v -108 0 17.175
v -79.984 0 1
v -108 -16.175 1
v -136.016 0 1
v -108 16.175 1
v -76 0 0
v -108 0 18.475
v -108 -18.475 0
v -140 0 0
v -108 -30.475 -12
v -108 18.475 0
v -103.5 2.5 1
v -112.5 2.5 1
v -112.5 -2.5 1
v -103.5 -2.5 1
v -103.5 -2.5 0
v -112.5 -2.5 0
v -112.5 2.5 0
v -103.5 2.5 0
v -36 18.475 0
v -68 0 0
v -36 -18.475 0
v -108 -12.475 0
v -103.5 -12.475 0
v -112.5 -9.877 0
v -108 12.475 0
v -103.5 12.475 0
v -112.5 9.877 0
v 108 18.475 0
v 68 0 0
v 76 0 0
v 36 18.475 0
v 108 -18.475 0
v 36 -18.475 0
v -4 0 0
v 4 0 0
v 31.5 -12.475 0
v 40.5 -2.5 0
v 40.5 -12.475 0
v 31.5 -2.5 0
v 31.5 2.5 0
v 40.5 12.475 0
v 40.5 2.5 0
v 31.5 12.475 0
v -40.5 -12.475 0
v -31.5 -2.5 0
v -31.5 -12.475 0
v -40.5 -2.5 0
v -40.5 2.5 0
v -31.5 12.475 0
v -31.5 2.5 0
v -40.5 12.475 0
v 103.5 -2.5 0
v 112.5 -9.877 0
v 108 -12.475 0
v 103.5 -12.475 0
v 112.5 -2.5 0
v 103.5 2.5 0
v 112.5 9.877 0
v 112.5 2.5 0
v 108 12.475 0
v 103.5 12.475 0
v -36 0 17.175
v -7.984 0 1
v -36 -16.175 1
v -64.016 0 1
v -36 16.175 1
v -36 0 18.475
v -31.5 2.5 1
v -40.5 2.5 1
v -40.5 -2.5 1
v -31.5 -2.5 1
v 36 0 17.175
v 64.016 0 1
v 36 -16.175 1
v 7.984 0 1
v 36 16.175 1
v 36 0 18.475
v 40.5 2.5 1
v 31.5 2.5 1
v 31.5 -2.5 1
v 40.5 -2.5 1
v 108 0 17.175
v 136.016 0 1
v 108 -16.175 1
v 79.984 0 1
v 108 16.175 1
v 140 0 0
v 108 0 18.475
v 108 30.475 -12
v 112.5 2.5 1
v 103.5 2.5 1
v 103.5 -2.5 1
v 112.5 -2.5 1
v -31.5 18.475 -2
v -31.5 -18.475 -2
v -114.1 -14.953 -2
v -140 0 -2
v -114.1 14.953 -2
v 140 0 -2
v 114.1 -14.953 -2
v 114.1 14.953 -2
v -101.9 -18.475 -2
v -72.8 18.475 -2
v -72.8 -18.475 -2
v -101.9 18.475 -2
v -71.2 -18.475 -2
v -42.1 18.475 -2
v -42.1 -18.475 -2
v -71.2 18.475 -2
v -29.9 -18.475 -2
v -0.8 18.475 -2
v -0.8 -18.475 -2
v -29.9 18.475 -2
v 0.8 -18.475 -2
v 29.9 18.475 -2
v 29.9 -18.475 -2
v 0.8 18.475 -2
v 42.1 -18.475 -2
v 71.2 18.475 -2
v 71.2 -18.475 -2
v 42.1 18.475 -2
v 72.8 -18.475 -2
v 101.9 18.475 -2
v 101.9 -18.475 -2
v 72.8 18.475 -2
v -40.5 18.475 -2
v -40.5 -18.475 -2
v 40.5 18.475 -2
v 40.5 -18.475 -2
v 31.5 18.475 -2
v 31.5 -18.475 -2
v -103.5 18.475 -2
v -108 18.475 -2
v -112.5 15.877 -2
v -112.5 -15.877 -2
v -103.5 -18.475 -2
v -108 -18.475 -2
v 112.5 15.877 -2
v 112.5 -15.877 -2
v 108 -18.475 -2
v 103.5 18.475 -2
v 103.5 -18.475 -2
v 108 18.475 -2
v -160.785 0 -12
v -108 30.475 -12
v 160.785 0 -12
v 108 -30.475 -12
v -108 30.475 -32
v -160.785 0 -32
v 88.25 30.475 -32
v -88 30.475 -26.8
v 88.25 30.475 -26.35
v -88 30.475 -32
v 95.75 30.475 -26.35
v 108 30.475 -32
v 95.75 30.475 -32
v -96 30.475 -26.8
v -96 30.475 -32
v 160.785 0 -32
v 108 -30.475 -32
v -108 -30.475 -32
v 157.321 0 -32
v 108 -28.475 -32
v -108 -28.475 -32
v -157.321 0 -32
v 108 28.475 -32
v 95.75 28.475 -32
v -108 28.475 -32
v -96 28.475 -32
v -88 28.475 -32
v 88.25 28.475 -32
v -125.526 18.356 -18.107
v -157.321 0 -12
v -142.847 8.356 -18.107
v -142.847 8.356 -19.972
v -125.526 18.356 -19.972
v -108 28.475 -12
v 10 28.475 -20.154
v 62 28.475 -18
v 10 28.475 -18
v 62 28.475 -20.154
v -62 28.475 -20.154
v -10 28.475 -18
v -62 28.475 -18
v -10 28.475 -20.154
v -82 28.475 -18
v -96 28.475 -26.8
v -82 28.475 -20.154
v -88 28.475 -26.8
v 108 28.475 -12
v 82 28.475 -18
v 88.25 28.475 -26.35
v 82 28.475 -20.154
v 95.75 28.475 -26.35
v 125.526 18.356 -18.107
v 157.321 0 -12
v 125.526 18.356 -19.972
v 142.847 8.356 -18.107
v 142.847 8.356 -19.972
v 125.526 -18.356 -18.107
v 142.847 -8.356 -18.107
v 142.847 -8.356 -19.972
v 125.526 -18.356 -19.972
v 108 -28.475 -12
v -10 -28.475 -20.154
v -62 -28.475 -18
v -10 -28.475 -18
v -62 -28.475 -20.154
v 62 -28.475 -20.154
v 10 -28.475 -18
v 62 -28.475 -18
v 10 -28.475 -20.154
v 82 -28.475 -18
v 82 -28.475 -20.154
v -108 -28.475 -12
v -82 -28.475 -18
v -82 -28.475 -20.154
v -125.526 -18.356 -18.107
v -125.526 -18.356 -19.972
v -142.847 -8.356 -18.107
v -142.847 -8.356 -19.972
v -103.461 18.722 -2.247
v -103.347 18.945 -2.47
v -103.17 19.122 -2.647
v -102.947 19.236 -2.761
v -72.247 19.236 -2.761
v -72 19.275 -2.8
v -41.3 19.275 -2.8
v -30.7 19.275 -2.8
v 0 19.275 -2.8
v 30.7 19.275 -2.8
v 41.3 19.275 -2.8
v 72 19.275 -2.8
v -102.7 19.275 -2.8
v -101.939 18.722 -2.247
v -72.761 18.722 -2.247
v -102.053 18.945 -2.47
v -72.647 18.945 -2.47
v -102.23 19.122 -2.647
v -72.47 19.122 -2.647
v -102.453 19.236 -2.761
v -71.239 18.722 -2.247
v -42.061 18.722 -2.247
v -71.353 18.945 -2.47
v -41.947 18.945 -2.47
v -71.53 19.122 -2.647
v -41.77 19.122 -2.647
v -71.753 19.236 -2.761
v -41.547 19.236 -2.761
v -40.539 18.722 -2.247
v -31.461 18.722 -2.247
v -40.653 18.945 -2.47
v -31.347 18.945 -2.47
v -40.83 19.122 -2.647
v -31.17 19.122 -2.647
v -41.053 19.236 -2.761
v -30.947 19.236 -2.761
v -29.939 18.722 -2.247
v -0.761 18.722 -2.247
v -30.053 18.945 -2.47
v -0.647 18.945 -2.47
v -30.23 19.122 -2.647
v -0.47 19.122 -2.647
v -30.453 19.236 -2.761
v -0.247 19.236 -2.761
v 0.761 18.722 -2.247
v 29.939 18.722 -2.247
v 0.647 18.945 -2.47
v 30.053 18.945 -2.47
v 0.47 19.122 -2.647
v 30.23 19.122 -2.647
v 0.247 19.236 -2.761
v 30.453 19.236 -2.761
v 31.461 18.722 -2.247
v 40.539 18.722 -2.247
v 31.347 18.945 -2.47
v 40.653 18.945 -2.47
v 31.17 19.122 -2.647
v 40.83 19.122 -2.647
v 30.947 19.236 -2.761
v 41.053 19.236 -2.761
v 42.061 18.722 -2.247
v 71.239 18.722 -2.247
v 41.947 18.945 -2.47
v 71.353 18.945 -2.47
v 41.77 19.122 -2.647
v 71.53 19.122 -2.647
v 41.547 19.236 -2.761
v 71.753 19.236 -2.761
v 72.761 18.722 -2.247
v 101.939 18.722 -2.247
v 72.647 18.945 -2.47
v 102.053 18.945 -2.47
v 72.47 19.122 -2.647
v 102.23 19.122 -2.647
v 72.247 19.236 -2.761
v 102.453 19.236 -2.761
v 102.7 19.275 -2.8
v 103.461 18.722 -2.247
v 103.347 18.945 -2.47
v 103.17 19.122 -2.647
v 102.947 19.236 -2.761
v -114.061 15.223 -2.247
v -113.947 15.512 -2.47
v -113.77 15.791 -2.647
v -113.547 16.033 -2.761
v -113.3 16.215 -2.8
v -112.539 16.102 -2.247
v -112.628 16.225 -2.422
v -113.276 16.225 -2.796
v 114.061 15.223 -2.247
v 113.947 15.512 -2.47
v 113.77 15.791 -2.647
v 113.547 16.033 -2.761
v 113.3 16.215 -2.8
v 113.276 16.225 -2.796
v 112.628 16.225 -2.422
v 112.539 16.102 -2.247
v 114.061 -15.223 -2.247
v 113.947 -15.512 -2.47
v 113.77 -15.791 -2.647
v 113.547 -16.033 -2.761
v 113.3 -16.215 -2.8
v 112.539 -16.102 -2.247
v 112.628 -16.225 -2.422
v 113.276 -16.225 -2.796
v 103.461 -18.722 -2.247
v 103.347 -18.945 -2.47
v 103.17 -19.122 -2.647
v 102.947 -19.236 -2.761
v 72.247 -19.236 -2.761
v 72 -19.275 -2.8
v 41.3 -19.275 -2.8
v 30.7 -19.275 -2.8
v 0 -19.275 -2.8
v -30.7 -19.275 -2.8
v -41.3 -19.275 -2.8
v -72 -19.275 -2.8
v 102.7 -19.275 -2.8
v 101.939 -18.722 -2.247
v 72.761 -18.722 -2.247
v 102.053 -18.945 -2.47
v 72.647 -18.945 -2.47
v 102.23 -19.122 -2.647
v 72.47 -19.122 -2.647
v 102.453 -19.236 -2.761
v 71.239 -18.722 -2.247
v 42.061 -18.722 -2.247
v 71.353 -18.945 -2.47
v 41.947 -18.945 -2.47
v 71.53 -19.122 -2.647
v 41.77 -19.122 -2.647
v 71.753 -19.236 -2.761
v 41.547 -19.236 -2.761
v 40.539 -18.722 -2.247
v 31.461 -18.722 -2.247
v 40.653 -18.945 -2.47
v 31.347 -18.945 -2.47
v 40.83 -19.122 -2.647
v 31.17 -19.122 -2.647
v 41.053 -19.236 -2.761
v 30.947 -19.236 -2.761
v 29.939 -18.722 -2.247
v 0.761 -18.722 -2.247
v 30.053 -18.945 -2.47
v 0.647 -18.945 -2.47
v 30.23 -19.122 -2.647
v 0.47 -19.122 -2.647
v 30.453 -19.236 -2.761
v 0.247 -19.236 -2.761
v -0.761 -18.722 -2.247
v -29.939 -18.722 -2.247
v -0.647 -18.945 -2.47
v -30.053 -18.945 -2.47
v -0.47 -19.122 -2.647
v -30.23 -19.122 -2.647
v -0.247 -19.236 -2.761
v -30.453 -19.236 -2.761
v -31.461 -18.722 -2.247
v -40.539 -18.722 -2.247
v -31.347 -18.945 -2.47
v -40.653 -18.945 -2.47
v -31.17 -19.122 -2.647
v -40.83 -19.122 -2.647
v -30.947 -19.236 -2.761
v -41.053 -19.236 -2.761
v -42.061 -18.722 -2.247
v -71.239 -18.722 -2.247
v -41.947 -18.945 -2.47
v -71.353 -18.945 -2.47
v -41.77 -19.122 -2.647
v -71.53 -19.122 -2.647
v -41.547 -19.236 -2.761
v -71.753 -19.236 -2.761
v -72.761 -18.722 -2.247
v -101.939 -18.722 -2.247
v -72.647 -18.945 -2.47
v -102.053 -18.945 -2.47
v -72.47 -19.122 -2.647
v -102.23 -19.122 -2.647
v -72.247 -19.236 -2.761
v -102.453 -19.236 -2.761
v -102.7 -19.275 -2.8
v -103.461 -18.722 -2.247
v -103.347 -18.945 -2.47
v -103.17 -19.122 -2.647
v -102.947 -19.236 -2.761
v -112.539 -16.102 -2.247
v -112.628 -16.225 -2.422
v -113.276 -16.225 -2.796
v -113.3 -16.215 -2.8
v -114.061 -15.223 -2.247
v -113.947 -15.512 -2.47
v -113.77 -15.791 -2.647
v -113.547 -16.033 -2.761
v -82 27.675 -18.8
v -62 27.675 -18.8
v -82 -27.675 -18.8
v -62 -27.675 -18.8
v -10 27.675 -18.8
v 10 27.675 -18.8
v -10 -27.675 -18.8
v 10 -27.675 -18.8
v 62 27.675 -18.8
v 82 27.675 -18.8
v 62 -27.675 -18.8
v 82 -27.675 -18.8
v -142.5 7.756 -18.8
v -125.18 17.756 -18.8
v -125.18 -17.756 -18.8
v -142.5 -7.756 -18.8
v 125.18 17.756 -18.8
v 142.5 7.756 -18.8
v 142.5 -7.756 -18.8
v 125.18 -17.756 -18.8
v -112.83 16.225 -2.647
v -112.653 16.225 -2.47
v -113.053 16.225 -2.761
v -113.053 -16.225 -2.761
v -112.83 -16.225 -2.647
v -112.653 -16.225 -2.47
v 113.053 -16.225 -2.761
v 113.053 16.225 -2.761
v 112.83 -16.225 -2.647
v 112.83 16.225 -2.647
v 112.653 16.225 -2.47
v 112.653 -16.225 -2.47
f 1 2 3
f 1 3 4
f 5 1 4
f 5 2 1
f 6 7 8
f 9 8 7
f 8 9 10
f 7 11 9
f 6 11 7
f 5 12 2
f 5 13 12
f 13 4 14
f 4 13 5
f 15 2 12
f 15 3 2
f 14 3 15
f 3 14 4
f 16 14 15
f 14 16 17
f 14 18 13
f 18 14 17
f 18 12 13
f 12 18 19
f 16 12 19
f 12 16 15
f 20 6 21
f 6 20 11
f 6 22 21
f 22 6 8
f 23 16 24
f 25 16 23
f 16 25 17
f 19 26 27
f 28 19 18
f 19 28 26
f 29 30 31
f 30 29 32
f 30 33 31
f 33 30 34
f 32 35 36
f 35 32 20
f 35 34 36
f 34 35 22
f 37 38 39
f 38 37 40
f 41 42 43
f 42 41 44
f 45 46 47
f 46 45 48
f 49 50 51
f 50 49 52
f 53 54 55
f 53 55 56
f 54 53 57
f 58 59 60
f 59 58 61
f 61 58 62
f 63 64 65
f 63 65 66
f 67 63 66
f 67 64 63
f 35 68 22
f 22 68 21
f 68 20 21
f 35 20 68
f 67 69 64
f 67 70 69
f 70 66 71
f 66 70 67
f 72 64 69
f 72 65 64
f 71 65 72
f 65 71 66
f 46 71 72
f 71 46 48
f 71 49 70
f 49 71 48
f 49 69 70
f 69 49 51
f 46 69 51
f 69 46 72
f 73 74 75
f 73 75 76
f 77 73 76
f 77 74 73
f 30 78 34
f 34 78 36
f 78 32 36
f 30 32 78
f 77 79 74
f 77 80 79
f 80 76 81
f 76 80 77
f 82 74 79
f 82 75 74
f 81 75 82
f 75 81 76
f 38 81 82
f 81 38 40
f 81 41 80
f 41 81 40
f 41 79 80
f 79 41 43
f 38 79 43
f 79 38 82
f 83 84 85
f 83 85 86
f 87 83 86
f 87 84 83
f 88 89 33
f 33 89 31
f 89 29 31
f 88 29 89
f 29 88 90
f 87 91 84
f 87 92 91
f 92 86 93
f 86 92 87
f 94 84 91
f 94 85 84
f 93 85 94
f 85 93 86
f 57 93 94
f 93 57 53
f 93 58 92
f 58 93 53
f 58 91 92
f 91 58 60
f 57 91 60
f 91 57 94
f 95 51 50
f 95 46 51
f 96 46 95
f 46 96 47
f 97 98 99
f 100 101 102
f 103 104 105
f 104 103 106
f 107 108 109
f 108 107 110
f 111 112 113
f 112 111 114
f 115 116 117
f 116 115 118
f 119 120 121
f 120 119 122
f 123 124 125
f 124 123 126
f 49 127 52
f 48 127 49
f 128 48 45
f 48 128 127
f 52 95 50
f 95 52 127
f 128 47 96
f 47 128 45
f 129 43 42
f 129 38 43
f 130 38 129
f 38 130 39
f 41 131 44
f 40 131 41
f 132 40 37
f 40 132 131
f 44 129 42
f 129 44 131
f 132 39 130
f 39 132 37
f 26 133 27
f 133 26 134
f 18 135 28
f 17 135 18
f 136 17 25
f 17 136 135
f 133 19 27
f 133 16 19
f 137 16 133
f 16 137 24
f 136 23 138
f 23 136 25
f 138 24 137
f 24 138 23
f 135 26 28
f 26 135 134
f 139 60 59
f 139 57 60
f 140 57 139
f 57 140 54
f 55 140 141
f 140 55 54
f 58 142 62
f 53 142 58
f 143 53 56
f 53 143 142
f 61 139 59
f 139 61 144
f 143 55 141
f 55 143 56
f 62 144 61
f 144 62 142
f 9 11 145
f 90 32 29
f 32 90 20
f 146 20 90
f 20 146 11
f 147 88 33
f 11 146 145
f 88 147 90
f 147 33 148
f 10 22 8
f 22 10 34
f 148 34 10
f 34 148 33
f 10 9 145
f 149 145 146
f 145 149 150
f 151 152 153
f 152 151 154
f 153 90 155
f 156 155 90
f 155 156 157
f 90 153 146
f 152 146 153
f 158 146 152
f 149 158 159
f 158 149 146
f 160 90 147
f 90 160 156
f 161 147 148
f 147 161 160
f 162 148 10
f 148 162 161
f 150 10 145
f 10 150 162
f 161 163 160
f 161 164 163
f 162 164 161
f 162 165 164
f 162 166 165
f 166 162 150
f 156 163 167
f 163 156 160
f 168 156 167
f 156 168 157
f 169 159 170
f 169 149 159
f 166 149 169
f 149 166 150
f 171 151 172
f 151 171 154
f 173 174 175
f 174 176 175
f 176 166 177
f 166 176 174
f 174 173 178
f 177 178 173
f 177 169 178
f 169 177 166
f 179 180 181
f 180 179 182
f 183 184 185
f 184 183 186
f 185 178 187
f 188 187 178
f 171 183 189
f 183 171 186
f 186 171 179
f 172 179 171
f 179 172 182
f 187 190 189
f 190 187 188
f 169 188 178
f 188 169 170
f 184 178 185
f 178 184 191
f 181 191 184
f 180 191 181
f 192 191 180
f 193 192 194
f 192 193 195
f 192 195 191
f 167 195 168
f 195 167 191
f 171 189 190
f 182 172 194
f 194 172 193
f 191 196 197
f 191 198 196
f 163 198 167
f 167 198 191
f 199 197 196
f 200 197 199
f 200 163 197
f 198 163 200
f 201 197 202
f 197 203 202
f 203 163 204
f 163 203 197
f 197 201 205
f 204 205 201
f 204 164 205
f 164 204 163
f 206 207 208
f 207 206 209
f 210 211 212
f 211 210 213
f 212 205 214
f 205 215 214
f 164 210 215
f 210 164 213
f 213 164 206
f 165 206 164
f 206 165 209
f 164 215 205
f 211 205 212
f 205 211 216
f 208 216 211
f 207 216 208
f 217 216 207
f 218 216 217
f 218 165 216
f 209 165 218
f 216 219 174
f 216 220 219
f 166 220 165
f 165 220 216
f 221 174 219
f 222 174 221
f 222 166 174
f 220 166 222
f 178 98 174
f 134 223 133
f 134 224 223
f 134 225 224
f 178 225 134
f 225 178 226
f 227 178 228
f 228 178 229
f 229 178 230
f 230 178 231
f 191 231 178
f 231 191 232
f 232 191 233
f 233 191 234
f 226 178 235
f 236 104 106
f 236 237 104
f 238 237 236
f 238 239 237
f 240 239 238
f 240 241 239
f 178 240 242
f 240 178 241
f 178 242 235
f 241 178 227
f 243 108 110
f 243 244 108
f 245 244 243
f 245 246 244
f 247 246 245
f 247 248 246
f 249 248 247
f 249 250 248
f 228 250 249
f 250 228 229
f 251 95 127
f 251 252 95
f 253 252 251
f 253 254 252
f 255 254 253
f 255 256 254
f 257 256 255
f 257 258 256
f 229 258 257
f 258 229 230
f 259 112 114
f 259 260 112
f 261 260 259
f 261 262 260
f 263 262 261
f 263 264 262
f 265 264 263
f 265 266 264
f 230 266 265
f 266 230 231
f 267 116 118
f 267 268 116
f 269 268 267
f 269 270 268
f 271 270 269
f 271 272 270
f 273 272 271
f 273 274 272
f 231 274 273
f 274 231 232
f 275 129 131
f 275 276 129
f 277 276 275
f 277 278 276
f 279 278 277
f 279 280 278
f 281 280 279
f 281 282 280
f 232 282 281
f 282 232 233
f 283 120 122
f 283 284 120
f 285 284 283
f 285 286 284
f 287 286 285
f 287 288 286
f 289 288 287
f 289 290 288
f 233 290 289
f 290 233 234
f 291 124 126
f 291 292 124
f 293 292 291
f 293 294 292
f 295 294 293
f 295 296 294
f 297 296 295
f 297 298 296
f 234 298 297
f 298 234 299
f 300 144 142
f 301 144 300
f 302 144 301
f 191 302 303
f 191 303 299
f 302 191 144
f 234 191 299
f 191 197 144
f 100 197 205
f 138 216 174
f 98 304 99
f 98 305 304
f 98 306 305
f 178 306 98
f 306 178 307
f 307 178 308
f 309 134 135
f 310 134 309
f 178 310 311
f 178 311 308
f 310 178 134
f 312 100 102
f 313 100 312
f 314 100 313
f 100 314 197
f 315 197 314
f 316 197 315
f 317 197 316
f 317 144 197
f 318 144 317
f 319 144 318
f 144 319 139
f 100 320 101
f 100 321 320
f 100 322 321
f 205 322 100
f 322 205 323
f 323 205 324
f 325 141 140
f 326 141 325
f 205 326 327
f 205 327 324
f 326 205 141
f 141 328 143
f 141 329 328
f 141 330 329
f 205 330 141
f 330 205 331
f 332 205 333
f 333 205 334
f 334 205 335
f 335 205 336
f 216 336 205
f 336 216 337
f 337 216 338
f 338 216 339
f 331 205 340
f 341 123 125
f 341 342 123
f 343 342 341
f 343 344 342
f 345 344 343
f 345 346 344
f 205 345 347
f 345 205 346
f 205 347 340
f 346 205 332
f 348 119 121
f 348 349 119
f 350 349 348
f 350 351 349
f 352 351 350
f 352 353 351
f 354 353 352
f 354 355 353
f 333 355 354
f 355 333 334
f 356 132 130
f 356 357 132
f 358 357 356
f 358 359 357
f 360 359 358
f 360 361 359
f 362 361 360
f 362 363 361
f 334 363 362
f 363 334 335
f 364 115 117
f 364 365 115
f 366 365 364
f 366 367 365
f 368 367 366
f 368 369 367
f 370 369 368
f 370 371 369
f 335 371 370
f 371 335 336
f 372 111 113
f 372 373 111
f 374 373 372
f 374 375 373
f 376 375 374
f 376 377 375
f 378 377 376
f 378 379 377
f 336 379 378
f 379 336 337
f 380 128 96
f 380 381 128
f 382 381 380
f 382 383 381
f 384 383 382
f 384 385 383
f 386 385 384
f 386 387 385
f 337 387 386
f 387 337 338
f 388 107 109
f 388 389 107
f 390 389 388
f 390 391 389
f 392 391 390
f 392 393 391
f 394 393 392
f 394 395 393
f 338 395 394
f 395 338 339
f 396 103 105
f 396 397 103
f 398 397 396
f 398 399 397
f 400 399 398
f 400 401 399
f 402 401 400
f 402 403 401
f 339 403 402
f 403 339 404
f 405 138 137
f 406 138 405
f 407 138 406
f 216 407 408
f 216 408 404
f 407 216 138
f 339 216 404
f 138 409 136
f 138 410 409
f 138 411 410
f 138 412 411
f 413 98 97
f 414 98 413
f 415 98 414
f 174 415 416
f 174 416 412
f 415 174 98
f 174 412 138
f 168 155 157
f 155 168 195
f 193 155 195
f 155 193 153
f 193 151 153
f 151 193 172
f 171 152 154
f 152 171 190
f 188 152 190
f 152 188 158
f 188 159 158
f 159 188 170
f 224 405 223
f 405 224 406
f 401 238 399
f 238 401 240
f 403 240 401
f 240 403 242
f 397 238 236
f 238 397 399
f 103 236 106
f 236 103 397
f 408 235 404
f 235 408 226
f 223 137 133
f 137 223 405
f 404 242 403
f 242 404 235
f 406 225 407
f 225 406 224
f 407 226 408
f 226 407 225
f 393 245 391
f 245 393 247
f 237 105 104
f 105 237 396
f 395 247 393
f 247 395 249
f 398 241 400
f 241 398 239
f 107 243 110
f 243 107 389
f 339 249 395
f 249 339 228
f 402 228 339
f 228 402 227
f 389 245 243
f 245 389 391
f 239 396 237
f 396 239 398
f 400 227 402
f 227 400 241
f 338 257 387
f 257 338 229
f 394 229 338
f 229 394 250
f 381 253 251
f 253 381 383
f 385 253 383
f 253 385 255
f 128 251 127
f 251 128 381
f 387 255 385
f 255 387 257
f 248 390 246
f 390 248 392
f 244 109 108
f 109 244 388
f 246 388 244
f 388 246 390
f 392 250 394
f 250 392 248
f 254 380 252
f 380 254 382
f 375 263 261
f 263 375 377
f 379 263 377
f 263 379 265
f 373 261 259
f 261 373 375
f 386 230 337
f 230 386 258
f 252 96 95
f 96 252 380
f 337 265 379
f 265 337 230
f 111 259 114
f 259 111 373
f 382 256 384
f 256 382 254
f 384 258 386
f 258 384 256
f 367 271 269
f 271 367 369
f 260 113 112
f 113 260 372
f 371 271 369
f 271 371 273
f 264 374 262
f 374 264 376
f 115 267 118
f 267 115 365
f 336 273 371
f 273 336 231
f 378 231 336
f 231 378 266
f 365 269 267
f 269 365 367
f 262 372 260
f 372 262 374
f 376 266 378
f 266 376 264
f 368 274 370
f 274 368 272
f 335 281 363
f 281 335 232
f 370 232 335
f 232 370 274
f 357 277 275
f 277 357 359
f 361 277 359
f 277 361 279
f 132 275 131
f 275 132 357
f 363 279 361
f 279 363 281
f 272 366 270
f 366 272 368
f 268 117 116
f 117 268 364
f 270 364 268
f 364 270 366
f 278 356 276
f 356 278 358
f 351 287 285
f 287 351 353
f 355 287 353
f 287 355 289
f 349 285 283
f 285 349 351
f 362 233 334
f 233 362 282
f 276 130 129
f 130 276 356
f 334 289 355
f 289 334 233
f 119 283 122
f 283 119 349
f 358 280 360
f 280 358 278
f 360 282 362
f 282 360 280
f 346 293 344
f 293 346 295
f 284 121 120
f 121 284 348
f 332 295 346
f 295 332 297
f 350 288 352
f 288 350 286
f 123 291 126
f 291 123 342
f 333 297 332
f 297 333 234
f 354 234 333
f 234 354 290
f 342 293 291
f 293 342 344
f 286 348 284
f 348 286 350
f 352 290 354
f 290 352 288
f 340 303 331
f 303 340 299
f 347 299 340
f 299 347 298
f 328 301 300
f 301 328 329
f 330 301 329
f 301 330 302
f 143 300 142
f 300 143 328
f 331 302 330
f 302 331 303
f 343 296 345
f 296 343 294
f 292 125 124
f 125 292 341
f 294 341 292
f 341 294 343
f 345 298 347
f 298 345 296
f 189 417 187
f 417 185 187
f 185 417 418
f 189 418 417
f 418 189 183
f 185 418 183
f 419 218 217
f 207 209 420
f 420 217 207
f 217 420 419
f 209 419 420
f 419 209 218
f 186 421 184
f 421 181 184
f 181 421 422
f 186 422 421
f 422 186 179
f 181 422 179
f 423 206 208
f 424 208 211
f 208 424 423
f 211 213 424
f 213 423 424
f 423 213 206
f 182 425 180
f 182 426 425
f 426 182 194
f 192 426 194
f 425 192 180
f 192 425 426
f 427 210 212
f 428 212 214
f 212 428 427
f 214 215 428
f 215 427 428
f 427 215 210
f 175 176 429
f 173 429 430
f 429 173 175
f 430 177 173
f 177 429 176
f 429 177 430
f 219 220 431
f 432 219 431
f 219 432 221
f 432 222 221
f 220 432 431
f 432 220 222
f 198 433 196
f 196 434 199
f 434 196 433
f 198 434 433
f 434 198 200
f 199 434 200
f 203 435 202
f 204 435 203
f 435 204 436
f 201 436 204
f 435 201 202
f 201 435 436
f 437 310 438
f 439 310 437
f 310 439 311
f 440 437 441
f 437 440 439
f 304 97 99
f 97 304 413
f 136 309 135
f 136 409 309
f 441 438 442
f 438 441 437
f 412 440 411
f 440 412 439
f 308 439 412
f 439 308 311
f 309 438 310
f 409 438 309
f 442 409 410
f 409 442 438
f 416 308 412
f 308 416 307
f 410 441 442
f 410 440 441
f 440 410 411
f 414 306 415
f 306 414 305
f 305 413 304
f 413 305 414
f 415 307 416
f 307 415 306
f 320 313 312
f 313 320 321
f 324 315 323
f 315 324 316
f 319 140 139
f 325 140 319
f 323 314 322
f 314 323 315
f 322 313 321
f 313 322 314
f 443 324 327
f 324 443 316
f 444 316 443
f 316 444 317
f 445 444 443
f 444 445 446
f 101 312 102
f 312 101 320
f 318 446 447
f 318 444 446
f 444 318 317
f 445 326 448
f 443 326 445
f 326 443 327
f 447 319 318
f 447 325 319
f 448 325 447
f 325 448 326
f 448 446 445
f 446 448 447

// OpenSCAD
s3 = sqrt(3);
s2 = sqrt(2);

studwidth = 64;
studheight = studwidth/s3/2;
holesize = 8;
holeheight = 8;
holetop = 11;
bottom = 1;
thickness = 1.3;
numstuds = 4;
studspace = 8;
sideheight = 12;
boxheight = 20;
boxthick = 2;
edge = 0;

for (i = [0:numstuds-1]) {
    color("white")
    translate([(i-(numstuds-1)/2)*(studwidth+studspace),0,0])
    lightstud();
}
color("DimGray") lightbox();
*color("Gray") translate([0,0,-boxheight-sideheight]) lightbottom();

*color("Teal") translate([0,1,-boxheight-sideheight+boxthick+1]) rotate([180,0,-90]) batteryholder();

*rotate([0,0,40]) mirror([0,0,1]) lightbox();
*lightstud();
*rotate([0,0,40]) lightbottom();


module clip() {
    cw = 6/2;
    ch = bottom+boxthick;
    linear_extrude(height=1) polygon([
        [-cw-1,-2],[-cw-2,-1],[-cw-2,0],
        [-cw,0],[-cw,ch],[-cw-1.5,ch+1.5],[-cw+0.5,ch+3.5],
        [-cw+2,ch+2],[-cw+2,0],
        [cw-2,0],[cw-2,ch+2],
        [cw-0.5,ch+3.5],[cw+1.5,ch+1.5],[cw,ch],[cw,0],
        [cw+2,0],[cw+2,-1],[cw+1,-2]
    ]);
}

module lightbox() {
    ol = boxthick-1;
    xs2 = (studwidth*(numstuds-1) + studspace*(numstuds-1))/2;
    xs1 = xs2 + studwidth/2 + s3*edge;
    ys = studheight + edge;
    h = sideheight;
    h2 = h + boxheight+2;
    xb1 = xs1 + h*s3;
    xb2 = xs2;
    yb = ys + h;
    
    xo1 = xb1 - ol*s3;
    xo2 = xb2;
    yo = yb - ol;
    
    ho = h2 - boxthick;
    xi1 = xb1 - boxthick*s3;
    xi2 = xb2;
    yi = yb - boxthick;
    hi = boxthick;
    
    sxs = studwidth/2-0.4*s3;
    sys = studwidth/s3/2-0.4;
    
    gw = 9/2;
    
    difference() {
        polyhedron(convexity=10,
            points = concat(
                hexbox(xs1,xs2,ys,0),
                hexbox(xb1,xb2,yb,-h),
                hexbox(xb1,xb2,yb,-ho),
                hexbox(xo1,xo2,yo,-ho),
                hexbox(xo1,xo2,yo,-ho),
                hexbox(xi1,xi2,yi,-ho),
                hexbox(xi1,xi2,yi,-h),
                hexbox(xs1,xs2,ys,-hi)
            ),
            faces = concat(
                [[for(i=[0:5]) i]],
                nquads(6,0),
                nquads(6,6),
                nquads(6,12),
                nquads(6,18),
                nquads(6,24),
                nquads(6,30),
                nquads(6,36),
                [[for(i=[5:-1:0]) i+42]]
            )
        );

        ys2 = ys-hi*3;
        #for (i = [1:numstuds-2]) {
            translate([(i-(numstuds-1)/2)*(studwidth+studspace),0,0]) 
            polyhedron(
                points = [
                [-gw,ys2,0],[gw,ys2,0],[gw,-ys2,0],[-gw,-ys2,0],
                [-gw,ys,-hi],[gw,ys,-hi],[gw,-ys,-hi],[-gw,-ys,-hi]],
                faces = [
                [0,1,2,3],
                [1,0,4,5],[2,1,5,6],[3,2,6,7],[0,3,7,4],
                [7,6,5,4]
                ]
            );
        }
        ysa = ys - gw/s3;
        ys2a = ys2 - gw/s3;
        #for (i = [-1:2:1]) {
            scale([i,1,1])
            translate([(((numstuds-1)/2))*(studwidth+studspace),0,0]) 
            polyhedron(
                points = [
                [-gw,ys2,0],[0,ys2,0],[gw,ys2a,0],[gw,-ys2a,0],[0,-ys2,0],[-gw,-ys2,0],
                [-gw,ys,-hi],[0,ys,-hi],[gw,ysa,-hi],[gw,-ysa,-hi],[0,-ys,-hi],[-gw,-ys,-hi]],
                faces = [
                [0,1,2,3,4,5],
                [1,0,6,7],[2,1,7,8],[3,2,8,9],
                [4,3,9,10],[5,4,10,11],[0,5,11,6],
                [11,10,9,8,7,6]
                ]
            );
        }
        // Switch hole
        translate([(numstuds/2-1)*(studwidth+studspace)+20,yi,boxthick-1-h2]) {
            translate([0,1,3.8])
            #cube([7.5,2.2,5.7],true);
        }

        // Micro-usb hole
        translate([-(numstuds/2-1)*(studwidth+studspace)-20,yi,boxthick-h2]) { 
            translate([0,1,2.6])
            #cube([8, 2.2, 5.2], true);
        }
    }
    
    for (i = [1:numstuds-1]) {
        translate([(i-(numstuds)/2)*(studwidth+studspace),0,-boxthick]) {
            translate([-30.7,0,0]) rotate([90,0,0]) cylinder(ys*2+1.7,0.8,0.8,true,$fn=20);
            //translate([  -10,0,0]) rotate([90,0,0]) cylinder(ys*2+1.7,0.8,0.8,true,$fn=20);
            translate([    0,0,0]) rotate([90,0,0]) cylinder(ys*2+1.7,0.8,0.8,true,$fn=20);
            translate([ 30.7,0,0]) rotate([90,0,0]) cylinder(ys*2+1.7,0.8,0.8,true,$fn=20);
        }
    }
    translate([(-numstuds/2)*(studwidth+studspace),0,-boxthick])
    translate([ 30.7,0,0]) rotate([90,0,0]) cylinder(ys*2-4.5,0.8,0.8,true,$fn=20);
    translate([(numstuds/2)*(studwidth+studspace),0,-boxthick])

    translate([-30.7,0,0]) rotate([90,0,0]) cylinder(ys*2-4.5,0.8,0.8,true,$fn=20);


    translate([0,0,-boxheight-sideheight+5]) {
        for (i = [0:numstuds-2]) {
            bottomtablip((i-(numstuds-2)/2)*(studwidth+studspace));
            mirror([0,1,0]) bottomtablip((i-(numstuds-2)/2)*(studwidth+studspace));
        }
        rpos = (studheight+edge+sideheight-boxthick-0.8) * s3/2;
        translate([-(studwidth+studspace)*(numstuds-1)/2,0,0]) rotate([0,0,30]) bottomtablip(-studwidth/4, rpos);
        translate([-(studwidth+studspace)*(numstuds-1)/2,0,0]) rotate([0,0,150]) bottomtablip(studwidth/4, rpos);
        translate([(studwidth+studspace)*(numstuds-1)/2,0,0]) rotate([0,0,-30]) bottomtablip(studwidth/4, rpos);
        translate([(studwidth+studspace)*(numstuds-1)/2,0,0]) rotate([0,0,-150]) bottomtablip(-studwidth/4, rpos);
    }
}

module lightbottom() {
    tol=0.2;
    ol = boxthick;
    
    xs2 = (studwidth*(numstuds-1) + studspace*(numstuds-1))/2;
    xs1 = xs2 + studwidth/2 + s3*edge;
    ys = studheight + edge;
    h = sideheight;
    xb1 = xs1 + h*s3;
    xb2 = xs2;
    yb = ys + h;
    
    xi1 = xb1 - ol*s3 - tol*s3;
    xi2 = xb2;
    yi = yb - ol - tol;

    xe1 = xi1 - 2.2*s3;
    xe2 = xi2;
    ye = yi - 2.2;
    
    difference() {
        union() {
            linear_extrude(height=boxthick-1) polygon([
                [-xi1,0],[-xi2,yi],[xi2,yi],[xi1,0],[xi2,-yi],[-xi2,-yi]
            ]);
            translate([0,0,-1])
            linear_extrude(height=1) polygon([
                [-xb1,0],[-xb2,yb],[xb2,yb],[xb1,0],[xb2,-yb],[-xb2,-yb]
            ]);
            translate([0,0,1])
            linear_extrude(height=7) polygon([
                [-xi1,0],[-xi2,yi],[xi2,yi],[xi1,0],[xi2,-yi],[-xi2,-yi],
                [-xi1,0],[-xe1,0],
                [-xe2,-ye],[xe2,-ye],[xe1,0],[xe2,ye],[-xe2,ye],[-xe1,0]
            ]);
        }
        for (i = [-numstuds+1:numstuds-1]) {
            translate([i*(studwidth+studspace)/2,0,-1.1])
            // rotate([0,0,30]) cylinder(boxthick+0.2,10,10,$fn=6);
            rotate([0,0,30]) hexslice();
        }
        // Switch hole
        translate([(numstuds/2-1)*(studwidth+studspace)+20,ye,boxthick-1]) {
            translate([0,1.1,4.3])
            #cube([7.5,2.4,5.8],true);
        }

        // Micro-usb port hole
        translate([-(numstuds/2-1)*(studwidth+studspace)-20,ye,boxthick]) {

            #translate([0, 1.1, 4.6]) cube([14, 2.4, 3.2], true);
            #translate([0, 1.1, 3]) cube([8, 2.4, 6], true);
        }
    }

    // Micro-usb port holder
    translate([-(numstuds/2-1)*(studwidth+studspace)-20,ye-7,boxthick]) {
        translate([ 0,0,0.9]) cube([12, 4, 4.2], true);
        translate([-5,3,0.9]) cube([2, 8.5, 4.2], true);
        translate([ 5,3,0.9]) cube([2, 8.5, 4.2], true);
        translate([ 4.2,0,3]) cylinder(3, 1.5, 1.5, $fn=36);
        translate([-4.2,0,3]) cylinder(3, 1.5, 1.5, $fn=36);
        translate([ 4.2,0,6]) cylinder(0.5, 1.5, 1.0, $fn=36);
        translate([-4.2,0,6]) cylinder(0.5, 1.5, 1.0, $fn=36);

        translate([-6.8, 0, 0]) musb_tab();
        translate([ 6.8, 0, 0]) mirror([1,0,0]) musb_tab();
        
        translate([ 0, 10, -1.1]) cube([7.8,2.8,2.2], true);
    }

    translate([0,0,5]) {
        for (i = [0:numstuds-2]) {
            bottomtab((i-(numstuds-2)/2)*(studwidth+studspace));
            mirror([0,1,0]) bottomtab((i-(numstuds-2)/2)*(studwidth+studspace));
        }
        rpos = (studheight+edge+sideheight-boxthick-0.9) * s3/2;
        translate([-(studwidth+studspace)*(numstuds-1)/2,0,0]) rotate([0,0,30]) bottomtab(-studwidth/4, rpos);
        translate([-(studwidth+studspace)*(numstuds-1)/2,0,0]) rotate([0,0,150]) bottomtab(studwidth/4, rpos);
        translate([(studwidth+studspace)*(numstuds-1)/2,0,0]) rotate([0,0,-30]) bottomtab(studwidth/4, rpos);
        translate([(studwidth+studspace)*(numstuds-1)/2,0,0]) rotate([0,0,-150]) bottomtab(-studwidth/4, rpos);
    }

    translate([(numstuds/2-1) * (studwidth+studspace) + studwidth/2+2, 0, boxthick-1]) mirror([0,0,1]) wemosd1();

    rotate([180,0,90]) translate([1,0,-boxthick-1]) batteryclips();
    
    // Switch holder
    translate([(numstuds/2-1)*(studwidth+studspace)+20,ye,boxthick-1]) {
        translate([0,-0.4,0]) difference() {
            union() {
                translate([ 8.25,0,3.5])
                cube([5.5,4,7], true);
                translate([-8.25,0,3.5])
                cube([5.5,4,7], true);
            }
            #translate([0,0,3.9])
            cube([20,0.4,6.4],true);
            #translate([0,0,7.1]) rotate([45,0,0])
            cube([20,0.8,0.8],true);
        }
        translate([0,3.1,0.2])
        cube([7.3,2.6,2.4],true);
        
        *translate([0,0,3])
        cube([7,20,3], true);
    }
    
    /*
    sch = boxheight;
    sth = boxheight + sideheight-2.5;
    stw = sideheight-2.5;
    for (i = [0:numstuds-1]) {
        translate([(i-(numstuds-1)/2)*(studwidth+studspace)+4.5,0,0]) {
            rotate([0,-90,0])
            linear_extrude(9) polygon([
                [0, yi],[sch,   yi],[sth, yi-stw],[sth  ,-yi+stw],[sch,  -yi],[0,-yi],
                [0,-ye],[sch-1,-ye],[sth-2,-ye+stw-1],[sth-2, ye-stw+1],[sch-1, ye],[0, ye]
            ]);
        }
    }
    */
    
}

module musb_tab(h=4.6, w=8) {
    rotate([0,-90,-90]) translate([0,0,-w/2]) linear_extrude(height=w) polygon([
        [-1.5,0],[h,0],[h+0.4,0.4],[h+2,-0.4],[h+1, -1.4],[-1.5,-1.4]
    ]);
}

module batteryclips() {
    translate([-33/2,-95/2,0]) batterypin();
    translate([-33/2, 95/2,0]) batterypin();
    translate([ 33/2,-95/2,0]) batterypin();
    translate([ 33/2, 95/2,0]) batterypin();
    translate([-14,-50.6,0]) rotate([0,0,180]) batterytab(10);
    translate([-14, 50.3,0]) batterytab(10);
    translate([ 14,-50.6,0]) rotate([0,0,180]) batterytab(10);
    translate([ 14, 50.3,0]) batterytab(10);
}

module batterypin() {
    rotate([0,0,360/48]) {
        translate([0,0,-1.9]) cylinder(4.0,2.25,2.25, $fn=24);
        translate([0,0,-3.0]) cylinder(1.2,1.1,1.2, $fn=24);
        translate([0,0,-4.0]) cylinder(1.0,0.8,1.1, $fn=24);
    }
}

module batterytab(w) {
    translate([-w/2,0,0]) rotate([0,90,0]) linear_extrude(height=w) polygon([
        [-2.1,0],[3.0,0],[3.8,-0.8],[6.5,0.5],[5.5,1.5],[-2.1,1.5]
    ]);
}


module hexslice(sz=14, sl=3, h=boxthick+0.2) {
    vs = (s3/2*sz)/((2*sl)-0.5);
    hs = (sz/2)/(sl-0.25);
    linear_extrude(height=h) union() {
        for (i = [-sl:-1]) polygon([[-sz-(i+0.25)*hs,(i+0.25)*vs*2],[sz+(i+0.25)*hs,(i+0.25)*vs*2],
            [sz+(i+0.75)*hs,(i+0.75)*vs*2],[-sz-(i+0.75)*hs,(i+0.75)*vs*2]]);
        for (i = [1:sl]) polygon([[-sz+(i-0.25)*hs,(i-0.25)*vs*2],[sz-(i-0.25)*hs,(i-0.25)*vs*2],
            [sz-(i-0.75)*hs,(i-0.75)*vs*2],[-sz+(i-0.75)*hs,(i-0.75)*vs*2]]);
    }
}

module lightstud() {
    tol=0;
    xs = studwidth/2-tol;
    ys = xs/s3;
    zs = studheight;
    cs = holesize/2;
    
    xse = xs - 0.6*s3;
    yse = ys - 0.6;
    
    //ch = holeheight;
    ch = 1;
    tt = thickness;
    zs2 = zs - tt;
    xs2 = xs - (ch+tt)*s3;
    ys2 = ys - (ch+tt);

    hs = 9/2;
    vs = 5/2;

    polyhedron(
        points = concat(
            [[0,0,zs2],[xs2,0,ch],[0,-ys2,ch],[-xs2,0,ch],[0,ys2,ch]],
            [[hs,-vs,ch],[-hs,-vs,ch],[-hs,vs,ch],[hs,vs,ch]],
            [[hs,-vs, 0],[-hs,-vs, 0],[-hs,vs, 0],[hs,vs, 0]],
            [[0,0,zs],[xs,0,0],[0,-ys,0],[-xs,0,0],[0,ys,0]]
        ),
        faces = concat(
            [[2,1,0],[3,2,0],[4,3,0],[1,4,0]],
            [[14,15,13],[15,16,13],[16,17,13],[17,14,13]],
            [[1,2,5],[2,3,6],[3,4,7],[4,1,8]],
            [[1,5,8],[2,6,5],[3,7,6],[4,8,7]],
            [[5,6,10,9],[6,7,11,10],[7,8,12,11],[8,5,9,12]],
            [[15,14,9],[16,15,10],[17,16,11],[14,17,12]],
            [[14,12,9],[15,9,10],[16,10,11],[17,11,12]]
        )
    );
}

module wemosd1() {
    *#translate([0,0,-2.4]) cube([34.6,25.4,4.8], true);
    // translate([-17.3,   0,0]) rotate([0,0,90]) mcutab(12);
    // translate([ 17.3,-7.2,0]) rotate([0,0,-90]) mcutab(8);
    translate([ 17.3, 0,0]) rotate([0,0,-90]) mcutab(15);
    translate([-17.3,-9.2,0]) rotate([0,0, 90]) mcutab(8);
    translate([-17.3, 9.2,0]) rotate([0,0, 90]) mcutab(8);

    translate([ 10,-12.7-2/2,-7/2+0.1]) cube([7,2,7],true);
    translate([ 10, 12.7+2/2,-7/2+0.1]) cube([7,2,7],true);
    translate([-05,-12.7-2/2,-7/2+0.1]) cube([7,2,7],true);
    translate([-10, 12.7+2/2,-7/2+0.1]) cube([7,2,7],true);
}

module mcutab(w) {
    translate([-w/2,0,0]) rotate([0,90,0]) linear_extrude(height=w) polygon([
        [0,0],[4.8,0],[5.4,-0.5],[7,0.5],[5.4,1.5],[0,1.5]
    ]);
}

module bottomtab(off=0, pos=studheight+edge+sideheight-boxthick-0.9) {
    translate([-10+off,pos,0])
    rotate([0,90,0])
    linear_extrude(height=20) polygon([
        [0,-1.5],[0,0],[-8.2,0],[-9,0.8],[-11,-0.5],[-9.5,-1.5]
    ]);
}

module bottomtablip(off=0, pos=studheight+edge+sideheight-boxthick-0.8) {
    translate([-10+off,pos,0])
    rotate([0,90,0])
    linear_extrude(height=20) polygon([
        [-6,1.3],[-8.2,0],[-9.5,1.3]
    ]);
}

module batteryholder() {
    cr=5;
    bh=50/2-cr;
    bw=100.5/2-cr;
    difference() {
        union() {
            translate([1,0.2,-3]) linear_extrude(height=1) polygon(concat(
                [for (an=[  0:10: 90]) [ bh+sin(an)*cr, bw+cos(an)*cr]],
                [for (an=[ 90:10:180]) [ bh+sin(an)*cr,-bw+cos(an)*cr]],
                [for (an=[180:10:270]) [-bh+sin(an)*cr,-bw+cos(an)*cr]],
                [for (an=[270:10:360]) [-bh+sin(an)*cr, bw+cos(an)*cr]]
            ));
            translate([0, 6,-12]) cube([40,77,24], true);
        }
        translate([-33/2,-95/2,-4.5]) cylinder(3,1.5,1.5, $fn=24);
        translate([-33/2, 95/2,-4.5]) cylinder(3,1.5,1.5, $fn=24);
        translate([ 33/2,-95/2,-4.5]) cylinder(3,1.5,1.5, $fn=24);
        translate([ 33/2, 95/2,-4.5]) cylinder(3,1.5,1.5, $fn=24);
    }
}

function nquads(n,o) = concat(
    [for (i=[0:n-1]) [(i+1)%n+o,i+o,i+o+n]],
    [for (i=[0:n-1]) [(i+1)%n+o,i+o+n,(i+1)%n+o+n]]
);
function hexbox(x1,x2,y,z) = [[-x1,0,z],[-x2,y,z],[x2,y,z],[x1,0,z],[x2,-y,z],[-x2,-y,z]];
